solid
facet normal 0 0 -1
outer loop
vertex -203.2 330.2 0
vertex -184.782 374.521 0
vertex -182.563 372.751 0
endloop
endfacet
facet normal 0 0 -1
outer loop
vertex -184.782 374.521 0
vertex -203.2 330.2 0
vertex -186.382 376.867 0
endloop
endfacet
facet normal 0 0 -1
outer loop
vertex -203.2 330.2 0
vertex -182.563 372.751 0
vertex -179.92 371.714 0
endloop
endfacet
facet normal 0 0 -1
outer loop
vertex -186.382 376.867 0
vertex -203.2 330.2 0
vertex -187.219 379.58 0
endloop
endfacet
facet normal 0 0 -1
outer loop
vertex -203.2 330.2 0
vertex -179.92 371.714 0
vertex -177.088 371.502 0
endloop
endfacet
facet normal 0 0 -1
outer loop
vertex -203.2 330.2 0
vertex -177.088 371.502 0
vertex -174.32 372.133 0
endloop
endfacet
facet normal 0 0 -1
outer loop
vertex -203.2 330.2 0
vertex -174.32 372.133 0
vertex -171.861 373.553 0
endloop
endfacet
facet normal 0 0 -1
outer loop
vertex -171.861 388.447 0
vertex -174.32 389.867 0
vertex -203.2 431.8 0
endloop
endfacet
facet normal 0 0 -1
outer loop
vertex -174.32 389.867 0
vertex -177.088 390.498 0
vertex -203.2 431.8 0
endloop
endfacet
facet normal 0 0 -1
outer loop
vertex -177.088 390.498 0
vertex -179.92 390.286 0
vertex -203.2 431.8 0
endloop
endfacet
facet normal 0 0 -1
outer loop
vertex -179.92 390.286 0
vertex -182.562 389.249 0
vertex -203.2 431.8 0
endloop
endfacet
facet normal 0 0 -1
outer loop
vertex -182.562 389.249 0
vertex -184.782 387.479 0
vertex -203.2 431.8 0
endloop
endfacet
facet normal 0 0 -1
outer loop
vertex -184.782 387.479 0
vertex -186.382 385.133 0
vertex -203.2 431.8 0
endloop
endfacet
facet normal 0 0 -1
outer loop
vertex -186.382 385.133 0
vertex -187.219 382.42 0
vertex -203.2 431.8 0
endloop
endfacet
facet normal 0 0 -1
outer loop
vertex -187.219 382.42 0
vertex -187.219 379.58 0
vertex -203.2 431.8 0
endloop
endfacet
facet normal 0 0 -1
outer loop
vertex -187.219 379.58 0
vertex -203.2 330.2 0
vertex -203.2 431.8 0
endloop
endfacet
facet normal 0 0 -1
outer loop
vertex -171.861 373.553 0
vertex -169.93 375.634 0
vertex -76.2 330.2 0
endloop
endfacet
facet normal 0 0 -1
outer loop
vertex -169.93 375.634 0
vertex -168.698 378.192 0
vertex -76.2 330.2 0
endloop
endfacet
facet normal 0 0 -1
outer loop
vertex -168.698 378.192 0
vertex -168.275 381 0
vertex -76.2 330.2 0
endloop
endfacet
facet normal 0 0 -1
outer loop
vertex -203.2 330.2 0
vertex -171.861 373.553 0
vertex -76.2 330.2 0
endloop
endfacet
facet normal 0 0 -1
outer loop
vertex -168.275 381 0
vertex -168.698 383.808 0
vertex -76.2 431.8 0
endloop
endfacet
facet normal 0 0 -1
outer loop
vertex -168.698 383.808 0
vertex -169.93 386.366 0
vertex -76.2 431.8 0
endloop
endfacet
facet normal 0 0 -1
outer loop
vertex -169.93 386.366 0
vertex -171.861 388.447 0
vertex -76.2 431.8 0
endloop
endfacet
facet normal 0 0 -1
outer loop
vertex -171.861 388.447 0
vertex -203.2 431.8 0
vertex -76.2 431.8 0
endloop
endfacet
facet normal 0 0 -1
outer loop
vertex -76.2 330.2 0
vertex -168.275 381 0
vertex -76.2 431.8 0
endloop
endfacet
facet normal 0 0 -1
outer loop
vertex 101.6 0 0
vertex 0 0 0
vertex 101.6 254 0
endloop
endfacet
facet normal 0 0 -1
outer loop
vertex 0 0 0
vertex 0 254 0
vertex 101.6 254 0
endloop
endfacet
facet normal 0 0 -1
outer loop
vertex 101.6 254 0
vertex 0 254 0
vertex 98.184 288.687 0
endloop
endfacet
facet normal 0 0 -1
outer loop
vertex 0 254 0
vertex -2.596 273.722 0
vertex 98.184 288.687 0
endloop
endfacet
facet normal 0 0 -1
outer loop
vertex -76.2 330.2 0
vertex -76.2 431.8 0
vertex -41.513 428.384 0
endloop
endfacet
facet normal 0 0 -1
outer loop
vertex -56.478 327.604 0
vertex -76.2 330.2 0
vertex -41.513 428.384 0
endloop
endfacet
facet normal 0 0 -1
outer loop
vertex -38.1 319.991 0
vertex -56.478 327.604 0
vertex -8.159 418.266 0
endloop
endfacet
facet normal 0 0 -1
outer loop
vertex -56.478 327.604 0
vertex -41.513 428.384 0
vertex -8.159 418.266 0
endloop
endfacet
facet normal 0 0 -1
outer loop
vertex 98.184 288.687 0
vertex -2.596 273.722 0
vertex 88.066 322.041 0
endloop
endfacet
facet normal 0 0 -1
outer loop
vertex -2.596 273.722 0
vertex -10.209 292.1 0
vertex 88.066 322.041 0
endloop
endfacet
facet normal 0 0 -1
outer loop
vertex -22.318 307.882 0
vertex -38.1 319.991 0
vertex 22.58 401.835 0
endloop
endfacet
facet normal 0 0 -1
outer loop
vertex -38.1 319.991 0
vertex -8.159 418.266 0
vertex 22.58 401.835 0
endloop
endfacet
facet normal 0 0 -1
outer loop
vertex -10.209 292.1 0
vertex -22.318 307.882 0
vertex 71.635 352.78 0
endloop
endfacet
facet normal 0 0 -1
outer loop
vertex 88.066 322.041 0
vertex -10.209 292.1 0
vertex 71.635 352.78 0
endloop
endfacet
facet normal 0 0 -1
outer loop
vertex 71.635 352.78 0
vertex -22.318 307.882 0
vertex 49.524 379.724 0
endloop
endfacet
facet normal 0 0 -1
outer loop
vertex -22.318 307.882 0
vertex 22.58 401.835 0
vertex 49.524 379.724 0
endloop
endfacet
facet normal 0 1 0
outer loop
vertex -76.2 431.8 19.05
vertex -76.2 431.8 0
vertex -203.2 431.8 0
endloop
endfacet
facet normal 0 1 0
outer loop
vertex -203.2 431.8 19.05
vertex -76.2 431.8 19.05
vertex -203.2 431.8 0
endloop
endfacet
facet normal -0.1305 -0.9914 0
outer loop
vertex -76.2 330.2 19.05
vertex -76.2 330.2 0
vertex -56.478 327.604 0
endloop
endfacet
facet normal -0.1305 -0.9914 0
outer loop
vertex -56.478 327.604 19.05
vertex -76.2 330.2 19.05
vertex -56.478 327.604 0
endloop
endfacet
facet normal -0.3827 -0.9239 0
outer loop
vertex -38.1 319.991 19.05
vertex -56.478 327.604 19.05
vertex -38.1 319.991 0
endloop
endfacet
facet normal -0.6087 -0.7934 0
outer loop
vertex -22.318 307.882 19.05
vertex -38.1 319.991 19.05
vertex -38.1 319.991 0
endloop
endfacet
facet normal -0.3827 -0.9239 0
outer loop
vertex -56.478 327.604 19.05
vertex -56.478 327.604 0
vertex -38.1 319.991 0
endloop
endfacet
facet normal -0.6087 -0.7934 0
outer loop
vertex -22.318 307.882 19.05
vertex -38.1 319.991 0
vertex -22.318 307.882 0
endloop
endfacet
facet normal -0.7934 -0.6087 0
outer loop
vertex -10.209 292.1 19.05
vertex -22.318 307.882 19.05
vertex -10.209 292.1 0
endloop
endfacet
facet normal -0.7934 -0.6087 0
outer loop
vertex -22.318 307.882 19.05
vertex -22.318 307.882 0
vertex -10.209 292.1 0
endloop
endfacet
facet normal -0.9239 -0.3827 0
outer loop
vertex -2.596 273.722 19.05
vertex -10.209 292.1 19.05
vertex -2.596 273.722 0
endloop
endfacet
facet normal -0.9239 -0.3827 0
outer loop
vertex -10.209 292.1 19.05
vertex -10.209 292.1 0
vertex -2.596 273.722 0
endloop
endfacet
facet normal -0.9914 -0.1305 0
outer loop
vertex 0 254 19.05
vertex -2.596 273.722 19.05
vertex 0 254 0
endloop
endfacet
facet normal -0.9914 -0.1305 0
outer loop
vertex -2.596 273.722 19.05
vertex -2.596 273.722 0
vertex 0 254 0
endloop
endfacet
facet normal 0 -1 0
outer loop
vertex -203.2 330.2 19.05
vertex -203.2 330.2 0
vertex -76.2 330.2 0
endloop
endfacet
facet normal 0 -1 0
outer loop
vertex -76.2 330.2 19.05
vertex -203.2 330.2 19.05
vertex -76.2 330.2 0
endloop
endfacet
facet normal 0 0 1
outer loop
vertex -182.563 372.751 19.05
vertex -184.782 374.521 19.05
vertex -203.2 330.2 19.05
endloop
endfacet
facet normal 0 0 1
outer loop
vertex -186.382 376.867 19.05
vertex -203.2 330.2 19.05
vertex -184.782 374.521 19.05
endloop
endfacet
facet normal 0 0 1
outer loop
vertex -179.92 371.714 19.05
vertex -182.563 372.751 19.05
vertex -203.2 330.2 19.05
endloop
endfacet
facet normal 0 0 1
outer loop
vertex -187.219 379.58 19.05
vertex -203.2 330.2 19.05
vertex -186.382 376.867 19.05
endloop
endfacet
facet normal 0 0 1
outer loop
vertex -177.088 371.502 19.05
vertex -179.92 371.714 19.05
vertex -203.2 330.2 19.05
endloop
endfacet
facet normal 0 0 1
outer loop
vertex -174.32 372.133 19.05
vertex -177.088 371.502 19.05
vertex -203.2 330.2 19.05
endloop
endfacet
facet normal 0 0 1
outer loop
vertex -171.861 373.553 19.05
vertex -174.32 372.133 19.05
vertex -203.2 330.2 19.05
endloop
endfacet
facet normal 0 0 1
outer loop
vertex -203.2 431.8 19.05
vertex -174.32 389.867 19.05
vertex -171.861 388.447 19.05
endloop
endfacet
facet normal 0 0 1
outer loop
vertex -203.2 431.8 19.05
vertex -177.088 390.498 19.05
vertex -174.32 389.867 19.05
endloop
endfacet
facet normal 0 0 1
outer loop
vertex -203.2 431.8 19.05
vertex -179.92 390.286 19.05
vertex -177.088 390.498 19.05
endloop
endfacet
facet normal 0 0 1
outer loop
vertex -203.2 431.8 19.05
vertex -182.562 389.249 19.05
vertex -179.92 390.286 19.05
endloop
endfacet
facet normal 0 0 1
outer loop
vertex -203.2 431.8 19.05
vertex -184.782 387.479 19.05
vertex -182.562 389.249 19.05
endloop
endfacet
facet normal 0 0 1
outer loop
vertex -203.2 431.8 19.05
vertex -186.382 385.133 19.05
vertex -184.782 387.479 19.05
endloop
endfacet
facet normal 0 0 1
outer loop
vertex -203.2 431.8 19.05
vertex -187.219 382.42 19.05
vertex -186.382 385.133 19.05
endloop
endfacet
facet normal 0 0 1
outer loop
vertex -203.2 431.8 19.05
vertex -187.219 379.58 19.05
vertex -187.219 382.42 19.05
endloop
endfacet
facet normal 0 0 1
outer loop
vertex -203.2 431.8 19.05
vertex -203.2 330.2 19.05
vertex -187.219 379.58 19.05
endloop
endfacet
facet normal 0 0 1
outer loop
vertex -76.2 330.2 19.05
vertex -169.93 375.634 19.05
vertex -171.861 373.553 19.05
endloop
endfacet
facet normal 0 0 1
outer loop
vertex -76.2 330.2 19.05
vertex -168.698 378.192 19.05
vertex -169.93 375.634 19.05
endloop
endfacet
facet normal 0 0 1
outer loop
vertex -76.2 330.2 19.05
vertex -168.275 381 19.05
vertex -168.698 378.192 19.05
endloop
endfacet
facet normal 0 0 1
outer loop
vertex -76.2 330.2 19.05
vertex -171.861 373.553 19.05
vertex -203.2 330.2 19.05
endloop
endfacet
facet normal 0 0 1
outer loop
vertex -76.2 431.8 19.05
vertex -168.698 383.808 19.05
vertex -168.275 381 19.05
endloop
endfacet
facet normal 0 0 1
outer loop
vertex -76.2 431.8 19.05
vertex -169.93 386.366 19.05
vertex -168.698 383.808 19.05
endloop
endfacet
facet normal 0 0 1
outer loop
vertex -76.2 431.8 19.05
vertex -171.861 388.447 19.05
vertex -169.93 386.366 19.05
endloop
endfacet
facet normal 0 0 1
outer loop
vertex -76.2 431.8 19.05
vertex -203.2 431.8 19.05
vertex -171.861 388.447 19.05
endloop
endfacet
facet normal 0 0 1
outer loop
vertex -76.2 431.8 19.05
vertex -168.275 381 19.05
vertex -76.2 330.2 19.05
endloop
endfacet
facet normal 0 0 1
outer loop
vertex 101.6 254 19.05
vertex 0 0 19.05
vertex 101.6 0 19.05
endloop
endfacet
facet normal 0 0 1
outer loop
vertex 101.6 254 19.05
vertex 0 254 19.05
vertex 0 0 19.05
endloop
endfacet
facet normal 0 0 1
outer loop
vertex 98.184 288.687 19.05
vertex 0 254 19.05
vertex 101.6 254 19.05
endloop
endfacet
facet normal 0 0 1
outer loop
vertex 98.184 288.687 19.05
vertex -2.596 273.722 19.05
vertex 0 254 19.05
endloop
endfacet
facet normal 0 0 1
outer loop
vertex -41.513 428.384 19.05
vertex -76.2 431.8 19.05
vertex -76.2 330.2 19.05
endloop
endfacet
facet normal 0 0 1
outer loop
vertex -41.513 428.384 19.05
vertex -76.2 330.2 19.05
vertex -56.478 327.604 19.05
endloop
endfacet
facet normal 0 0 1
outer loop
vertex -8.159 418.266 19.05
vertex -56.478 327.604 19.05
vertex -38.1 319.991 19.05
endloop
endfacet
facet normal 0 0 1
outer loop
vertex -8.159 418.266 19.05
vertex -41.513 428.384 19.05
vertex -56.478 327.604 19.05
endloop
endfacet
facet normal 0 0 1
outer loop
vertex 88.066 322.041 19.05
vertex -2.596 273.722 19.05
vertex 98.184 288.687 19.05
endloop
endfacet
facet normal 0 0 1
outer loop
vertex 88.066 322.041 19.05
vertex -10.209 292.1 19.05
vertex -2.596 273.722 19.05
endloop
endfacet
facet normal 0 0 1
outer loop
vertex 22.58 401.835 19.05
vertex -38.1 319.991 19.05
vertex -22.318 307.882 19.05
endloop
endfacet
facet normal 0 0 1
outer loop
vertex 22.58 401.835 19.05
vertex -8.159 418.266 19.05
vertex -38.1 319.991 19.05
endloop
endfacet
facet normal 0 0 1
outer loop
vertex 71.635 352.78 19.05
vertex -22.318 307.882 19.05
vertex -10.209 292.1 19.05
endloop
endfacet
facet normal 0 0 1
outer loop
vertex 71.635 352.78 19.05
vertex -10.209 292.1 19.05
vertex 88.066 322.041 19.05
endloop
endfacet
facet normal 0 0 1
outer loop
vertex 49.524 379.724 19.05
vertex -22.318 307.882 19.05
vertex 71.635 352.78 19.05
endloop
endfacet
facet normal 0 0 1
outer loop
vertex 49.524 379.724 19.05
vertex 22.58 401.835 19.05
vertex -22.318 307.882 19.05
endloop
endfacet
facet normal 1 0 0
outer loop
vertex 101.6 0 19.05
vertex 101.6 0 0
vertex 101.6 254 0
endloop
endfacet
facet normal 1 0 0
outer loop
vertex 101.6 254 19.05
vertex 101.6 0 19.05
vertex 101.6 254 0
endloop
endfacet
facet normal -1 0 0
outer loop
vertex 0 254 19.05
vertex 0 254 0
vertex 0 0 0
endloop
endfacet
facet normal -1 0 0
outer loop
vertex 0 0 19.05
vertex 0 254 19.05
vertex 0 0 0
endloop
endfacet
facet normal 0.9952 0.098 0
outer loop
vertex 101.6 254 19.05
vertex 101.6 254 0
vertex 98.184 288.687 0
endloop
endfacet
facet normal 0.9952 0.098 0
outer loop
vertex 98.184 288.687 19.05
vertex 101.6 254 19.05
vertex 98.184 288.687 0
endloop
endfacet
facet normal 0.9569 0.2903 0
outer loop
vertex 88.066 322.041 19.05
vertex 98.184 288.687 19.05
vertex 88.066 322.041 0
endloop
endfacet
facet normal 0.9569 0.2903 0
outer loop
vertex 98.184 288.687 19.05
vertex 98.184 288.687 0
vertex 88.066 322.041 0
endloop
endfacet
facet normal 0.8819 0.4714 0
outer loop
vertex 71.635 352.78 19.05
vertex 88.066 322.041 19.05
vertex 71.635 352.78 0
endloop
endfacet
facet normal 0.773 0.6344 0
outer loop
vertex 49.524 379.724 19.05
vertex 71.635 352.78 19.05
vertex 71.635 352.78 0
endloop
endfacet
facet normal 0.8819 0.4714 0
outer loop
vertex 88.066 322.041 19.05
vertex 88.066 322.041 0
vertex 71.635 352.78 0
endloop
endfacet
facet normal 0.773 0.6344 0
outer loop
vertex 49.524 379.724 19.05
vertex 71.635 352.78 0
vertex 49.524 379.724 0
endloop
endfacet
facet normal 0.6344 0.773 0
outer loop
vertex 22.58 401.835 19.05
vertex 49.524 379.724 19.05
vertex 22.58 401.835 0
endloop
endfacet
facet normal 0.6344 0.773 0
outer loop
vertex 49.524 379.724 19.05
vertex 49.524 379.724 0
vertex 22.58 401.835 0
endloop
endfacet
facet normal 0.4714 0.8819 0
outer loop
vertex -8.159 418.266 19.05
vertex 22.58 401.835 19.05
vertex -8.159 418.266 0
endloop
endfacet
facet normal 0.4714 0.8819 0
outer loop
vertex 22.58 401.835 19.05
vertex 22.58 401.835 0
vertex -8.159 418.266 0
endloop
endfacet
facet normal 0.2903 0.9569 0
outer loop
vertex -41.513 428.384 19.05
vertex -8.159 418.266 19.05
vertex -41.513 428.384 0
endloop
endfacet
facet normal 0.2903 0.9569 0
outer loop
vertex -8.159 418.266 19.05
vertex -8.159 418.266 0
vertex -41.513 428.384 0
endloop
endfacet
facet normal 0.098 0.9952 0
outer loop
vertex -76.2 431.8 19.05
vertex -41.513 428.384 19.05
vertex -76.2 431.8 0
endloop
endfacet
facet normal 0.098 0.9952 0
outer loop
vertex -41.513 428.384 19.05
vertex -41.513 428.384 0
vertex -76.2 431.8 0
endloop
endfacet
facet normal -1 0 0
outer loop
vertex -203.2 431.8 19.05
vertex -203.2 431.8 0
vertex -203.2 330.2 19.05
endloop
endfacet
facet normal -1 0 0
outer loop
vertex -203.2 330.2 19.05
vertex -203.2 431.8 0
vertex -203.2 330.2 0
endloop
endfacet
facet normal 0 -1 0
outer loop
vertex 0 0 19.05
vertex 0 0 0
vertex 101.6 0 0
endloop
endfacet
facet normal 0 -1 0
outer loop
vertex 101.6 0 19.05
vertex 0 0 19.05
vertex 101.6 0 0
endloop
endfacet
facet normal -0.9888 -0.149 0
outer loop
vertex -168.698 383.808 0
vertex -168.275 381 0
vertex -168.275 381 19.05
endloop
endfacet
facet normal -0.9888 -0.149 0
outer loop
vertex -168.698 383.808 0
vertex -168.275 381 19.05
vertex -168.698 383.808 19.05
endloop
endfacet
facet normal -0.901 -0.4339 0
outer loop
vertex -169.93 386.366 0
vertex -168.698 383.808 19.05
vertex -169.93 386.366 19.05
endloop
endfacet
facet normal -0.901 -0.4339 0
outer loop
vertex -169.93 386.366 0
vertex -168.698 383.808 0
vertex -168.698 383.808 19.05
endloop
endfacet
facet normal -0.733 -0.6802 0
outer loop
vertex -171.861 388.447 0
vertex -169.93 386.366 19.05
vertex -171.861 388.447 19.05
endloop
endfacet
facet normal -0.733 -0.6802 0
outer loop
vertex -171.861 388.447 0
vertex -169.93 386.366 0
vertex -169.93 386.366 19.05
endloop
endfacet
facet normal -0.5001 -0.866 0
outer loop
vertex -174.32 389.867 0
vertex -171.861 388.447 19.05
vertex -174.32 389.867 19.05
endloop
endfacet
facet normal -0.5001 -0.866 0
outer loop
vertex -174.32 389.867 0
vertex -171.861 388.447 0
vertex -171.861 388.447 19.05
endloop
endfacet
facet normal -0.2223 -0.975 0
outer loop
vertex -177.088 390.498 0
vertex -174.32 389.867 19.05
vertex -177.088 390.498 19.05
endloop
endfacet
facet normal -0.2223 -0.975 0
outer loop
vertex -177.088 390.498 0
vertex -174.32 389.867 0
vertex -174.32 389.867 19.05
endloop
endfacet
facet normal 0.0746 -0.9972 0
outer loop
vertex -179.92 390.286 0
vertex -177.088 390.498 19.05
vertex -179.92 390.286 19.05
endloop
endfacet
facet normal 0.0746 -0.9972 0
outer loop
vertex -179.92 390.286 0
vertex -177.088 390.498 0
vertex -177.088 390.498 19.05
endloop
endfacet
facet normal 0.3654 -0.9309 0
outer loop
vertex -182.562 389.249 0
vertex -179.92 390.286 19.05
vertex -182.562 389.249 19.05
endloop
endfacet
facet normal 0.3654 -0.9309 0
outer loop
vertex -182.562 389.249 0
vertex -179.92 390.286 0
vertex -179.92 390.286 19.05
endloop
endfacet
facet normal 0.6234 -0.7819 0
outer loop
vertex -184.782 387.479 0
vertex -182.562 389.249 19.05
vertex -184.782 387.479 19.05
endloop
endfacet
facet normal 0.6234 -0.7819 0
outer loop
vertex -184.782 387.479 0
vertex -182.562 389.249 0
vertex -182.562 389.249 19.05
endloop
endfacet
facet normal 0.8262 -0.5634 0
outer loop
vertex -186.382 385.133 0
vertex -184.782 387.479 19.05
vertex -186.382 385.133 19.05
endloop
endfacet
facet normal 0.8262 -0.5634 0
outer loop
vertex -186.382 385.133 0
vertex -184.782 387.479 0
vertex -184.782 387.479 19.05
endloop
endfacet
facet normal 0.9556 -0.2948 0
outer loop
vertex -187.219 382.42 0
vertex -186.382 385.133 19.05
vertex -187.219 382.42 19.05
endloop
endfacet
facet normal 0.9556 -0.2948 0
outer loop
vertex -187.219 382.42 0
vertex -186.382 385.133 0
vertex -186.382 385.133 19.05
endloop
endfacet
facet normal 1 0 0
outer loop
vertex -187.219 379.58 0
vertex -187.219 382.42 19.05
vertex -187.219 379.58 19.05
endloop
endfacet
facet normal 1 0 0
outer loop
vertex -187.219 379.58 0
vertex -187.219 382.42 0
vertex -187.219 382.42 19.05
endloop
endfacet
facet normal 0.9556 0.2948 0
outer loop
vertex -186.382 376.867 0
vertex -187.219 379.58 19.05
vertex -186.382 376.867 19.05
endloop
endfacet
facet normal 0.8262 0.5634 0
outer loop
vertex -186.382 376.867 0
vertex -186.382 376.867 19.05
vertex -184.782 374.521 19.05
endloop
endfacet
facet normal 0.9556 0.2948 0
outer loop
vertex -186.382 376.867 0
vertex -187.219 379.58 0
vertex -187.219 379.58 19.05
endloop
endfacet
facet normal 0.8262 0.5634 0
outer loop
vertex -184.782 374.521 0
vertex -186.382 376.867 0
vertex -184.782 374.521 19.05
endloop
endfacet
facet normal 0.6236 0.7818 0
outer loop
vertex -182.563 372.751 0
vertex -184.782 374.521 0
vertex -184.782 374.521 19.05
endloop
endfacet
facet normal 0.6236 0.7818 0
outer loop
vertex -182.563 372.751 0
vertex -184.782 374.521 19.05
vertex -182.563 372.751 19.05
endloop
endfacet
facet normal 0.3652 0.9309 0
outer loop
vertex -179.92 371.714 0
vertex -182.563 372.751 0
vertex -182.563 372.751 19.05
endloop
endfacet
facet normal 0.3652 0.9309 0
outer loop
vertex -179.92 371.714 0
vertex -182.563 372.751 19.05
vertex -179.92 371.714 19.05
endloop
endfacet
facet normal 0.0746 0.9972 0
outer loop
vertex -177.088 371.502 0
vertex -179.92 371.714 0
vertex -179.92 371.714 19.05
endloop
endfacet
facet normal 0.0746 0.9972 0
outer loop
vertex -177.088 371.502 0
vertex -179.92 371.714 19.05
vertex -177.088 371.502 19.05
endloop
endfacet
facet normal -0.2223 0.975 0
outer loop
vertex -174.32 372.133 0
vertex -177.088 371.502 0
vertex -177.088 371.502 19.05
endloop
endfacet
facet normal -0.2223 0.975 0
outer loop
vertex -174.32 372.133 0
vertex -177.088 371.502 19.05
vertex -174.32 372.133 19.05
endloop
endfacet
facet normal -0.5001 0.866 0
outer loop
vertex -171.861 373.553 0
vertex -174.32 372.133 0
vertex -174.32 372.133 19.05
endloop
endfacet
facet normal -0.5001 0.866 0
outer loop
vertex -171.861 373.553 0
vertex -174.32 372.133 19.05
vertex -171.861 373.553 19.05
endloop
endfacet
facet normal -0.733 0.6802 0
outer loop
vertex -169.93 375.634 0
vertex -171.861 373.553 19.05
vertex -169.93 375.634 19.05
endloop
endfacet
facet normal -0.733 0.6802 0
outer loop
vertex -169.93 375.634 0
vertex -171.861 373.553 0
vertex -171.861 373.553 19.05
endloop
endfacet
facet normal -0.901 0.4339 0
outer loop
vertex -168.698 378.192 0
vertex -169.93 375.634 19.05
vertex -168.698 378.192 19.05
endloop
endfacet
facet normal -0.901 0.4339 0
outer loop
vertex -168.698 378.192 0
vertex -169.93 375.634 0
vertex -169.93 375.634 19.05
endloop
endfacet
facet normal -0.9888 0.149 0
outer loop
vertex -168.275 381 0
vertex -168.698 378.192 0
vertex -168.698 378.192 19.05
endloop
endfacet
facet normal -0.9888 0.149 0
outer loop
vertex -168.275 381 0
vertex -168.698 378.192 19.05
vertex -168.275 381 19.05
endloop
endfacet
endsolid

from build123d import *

# Parameters (mm, degrees)
SKETCH3_R      = 9.525
EXTRUDE1_DEPTH = 19.05


with BuildPart() as part:
    # Sketch3 → Extrude1 (new body)
    with BuildSketch(Plane.XY):
        with BuildLine():
            Line((0, 0), (101.6, 0))
            Line((101.6, 0), (101.6, 254))
            ThreePointArc((101.6, 254), (49.523585695, 379.723585695), (-76.2, 431.8))
            Line((-76.2, 431.8), (-203.2, 431.8))
            Line((-203.2, 431.8), (-203.2, 330.2))
            Line((-203.2, 330.2), (-76.2, 330.2))
            ThreePointArc((-76.2, 330.2), (-22.318463274, 307.881536726), (0, 254))
            Line((0, 254), (0, 0))
        make_face()
        with Locations((-177.8, 381)):
            Circle(SKETCH3_R, mode=Mode.SUBTRACT)
    extrude(amount=EXTRUDE1_DEPTH)


solid = part.part
